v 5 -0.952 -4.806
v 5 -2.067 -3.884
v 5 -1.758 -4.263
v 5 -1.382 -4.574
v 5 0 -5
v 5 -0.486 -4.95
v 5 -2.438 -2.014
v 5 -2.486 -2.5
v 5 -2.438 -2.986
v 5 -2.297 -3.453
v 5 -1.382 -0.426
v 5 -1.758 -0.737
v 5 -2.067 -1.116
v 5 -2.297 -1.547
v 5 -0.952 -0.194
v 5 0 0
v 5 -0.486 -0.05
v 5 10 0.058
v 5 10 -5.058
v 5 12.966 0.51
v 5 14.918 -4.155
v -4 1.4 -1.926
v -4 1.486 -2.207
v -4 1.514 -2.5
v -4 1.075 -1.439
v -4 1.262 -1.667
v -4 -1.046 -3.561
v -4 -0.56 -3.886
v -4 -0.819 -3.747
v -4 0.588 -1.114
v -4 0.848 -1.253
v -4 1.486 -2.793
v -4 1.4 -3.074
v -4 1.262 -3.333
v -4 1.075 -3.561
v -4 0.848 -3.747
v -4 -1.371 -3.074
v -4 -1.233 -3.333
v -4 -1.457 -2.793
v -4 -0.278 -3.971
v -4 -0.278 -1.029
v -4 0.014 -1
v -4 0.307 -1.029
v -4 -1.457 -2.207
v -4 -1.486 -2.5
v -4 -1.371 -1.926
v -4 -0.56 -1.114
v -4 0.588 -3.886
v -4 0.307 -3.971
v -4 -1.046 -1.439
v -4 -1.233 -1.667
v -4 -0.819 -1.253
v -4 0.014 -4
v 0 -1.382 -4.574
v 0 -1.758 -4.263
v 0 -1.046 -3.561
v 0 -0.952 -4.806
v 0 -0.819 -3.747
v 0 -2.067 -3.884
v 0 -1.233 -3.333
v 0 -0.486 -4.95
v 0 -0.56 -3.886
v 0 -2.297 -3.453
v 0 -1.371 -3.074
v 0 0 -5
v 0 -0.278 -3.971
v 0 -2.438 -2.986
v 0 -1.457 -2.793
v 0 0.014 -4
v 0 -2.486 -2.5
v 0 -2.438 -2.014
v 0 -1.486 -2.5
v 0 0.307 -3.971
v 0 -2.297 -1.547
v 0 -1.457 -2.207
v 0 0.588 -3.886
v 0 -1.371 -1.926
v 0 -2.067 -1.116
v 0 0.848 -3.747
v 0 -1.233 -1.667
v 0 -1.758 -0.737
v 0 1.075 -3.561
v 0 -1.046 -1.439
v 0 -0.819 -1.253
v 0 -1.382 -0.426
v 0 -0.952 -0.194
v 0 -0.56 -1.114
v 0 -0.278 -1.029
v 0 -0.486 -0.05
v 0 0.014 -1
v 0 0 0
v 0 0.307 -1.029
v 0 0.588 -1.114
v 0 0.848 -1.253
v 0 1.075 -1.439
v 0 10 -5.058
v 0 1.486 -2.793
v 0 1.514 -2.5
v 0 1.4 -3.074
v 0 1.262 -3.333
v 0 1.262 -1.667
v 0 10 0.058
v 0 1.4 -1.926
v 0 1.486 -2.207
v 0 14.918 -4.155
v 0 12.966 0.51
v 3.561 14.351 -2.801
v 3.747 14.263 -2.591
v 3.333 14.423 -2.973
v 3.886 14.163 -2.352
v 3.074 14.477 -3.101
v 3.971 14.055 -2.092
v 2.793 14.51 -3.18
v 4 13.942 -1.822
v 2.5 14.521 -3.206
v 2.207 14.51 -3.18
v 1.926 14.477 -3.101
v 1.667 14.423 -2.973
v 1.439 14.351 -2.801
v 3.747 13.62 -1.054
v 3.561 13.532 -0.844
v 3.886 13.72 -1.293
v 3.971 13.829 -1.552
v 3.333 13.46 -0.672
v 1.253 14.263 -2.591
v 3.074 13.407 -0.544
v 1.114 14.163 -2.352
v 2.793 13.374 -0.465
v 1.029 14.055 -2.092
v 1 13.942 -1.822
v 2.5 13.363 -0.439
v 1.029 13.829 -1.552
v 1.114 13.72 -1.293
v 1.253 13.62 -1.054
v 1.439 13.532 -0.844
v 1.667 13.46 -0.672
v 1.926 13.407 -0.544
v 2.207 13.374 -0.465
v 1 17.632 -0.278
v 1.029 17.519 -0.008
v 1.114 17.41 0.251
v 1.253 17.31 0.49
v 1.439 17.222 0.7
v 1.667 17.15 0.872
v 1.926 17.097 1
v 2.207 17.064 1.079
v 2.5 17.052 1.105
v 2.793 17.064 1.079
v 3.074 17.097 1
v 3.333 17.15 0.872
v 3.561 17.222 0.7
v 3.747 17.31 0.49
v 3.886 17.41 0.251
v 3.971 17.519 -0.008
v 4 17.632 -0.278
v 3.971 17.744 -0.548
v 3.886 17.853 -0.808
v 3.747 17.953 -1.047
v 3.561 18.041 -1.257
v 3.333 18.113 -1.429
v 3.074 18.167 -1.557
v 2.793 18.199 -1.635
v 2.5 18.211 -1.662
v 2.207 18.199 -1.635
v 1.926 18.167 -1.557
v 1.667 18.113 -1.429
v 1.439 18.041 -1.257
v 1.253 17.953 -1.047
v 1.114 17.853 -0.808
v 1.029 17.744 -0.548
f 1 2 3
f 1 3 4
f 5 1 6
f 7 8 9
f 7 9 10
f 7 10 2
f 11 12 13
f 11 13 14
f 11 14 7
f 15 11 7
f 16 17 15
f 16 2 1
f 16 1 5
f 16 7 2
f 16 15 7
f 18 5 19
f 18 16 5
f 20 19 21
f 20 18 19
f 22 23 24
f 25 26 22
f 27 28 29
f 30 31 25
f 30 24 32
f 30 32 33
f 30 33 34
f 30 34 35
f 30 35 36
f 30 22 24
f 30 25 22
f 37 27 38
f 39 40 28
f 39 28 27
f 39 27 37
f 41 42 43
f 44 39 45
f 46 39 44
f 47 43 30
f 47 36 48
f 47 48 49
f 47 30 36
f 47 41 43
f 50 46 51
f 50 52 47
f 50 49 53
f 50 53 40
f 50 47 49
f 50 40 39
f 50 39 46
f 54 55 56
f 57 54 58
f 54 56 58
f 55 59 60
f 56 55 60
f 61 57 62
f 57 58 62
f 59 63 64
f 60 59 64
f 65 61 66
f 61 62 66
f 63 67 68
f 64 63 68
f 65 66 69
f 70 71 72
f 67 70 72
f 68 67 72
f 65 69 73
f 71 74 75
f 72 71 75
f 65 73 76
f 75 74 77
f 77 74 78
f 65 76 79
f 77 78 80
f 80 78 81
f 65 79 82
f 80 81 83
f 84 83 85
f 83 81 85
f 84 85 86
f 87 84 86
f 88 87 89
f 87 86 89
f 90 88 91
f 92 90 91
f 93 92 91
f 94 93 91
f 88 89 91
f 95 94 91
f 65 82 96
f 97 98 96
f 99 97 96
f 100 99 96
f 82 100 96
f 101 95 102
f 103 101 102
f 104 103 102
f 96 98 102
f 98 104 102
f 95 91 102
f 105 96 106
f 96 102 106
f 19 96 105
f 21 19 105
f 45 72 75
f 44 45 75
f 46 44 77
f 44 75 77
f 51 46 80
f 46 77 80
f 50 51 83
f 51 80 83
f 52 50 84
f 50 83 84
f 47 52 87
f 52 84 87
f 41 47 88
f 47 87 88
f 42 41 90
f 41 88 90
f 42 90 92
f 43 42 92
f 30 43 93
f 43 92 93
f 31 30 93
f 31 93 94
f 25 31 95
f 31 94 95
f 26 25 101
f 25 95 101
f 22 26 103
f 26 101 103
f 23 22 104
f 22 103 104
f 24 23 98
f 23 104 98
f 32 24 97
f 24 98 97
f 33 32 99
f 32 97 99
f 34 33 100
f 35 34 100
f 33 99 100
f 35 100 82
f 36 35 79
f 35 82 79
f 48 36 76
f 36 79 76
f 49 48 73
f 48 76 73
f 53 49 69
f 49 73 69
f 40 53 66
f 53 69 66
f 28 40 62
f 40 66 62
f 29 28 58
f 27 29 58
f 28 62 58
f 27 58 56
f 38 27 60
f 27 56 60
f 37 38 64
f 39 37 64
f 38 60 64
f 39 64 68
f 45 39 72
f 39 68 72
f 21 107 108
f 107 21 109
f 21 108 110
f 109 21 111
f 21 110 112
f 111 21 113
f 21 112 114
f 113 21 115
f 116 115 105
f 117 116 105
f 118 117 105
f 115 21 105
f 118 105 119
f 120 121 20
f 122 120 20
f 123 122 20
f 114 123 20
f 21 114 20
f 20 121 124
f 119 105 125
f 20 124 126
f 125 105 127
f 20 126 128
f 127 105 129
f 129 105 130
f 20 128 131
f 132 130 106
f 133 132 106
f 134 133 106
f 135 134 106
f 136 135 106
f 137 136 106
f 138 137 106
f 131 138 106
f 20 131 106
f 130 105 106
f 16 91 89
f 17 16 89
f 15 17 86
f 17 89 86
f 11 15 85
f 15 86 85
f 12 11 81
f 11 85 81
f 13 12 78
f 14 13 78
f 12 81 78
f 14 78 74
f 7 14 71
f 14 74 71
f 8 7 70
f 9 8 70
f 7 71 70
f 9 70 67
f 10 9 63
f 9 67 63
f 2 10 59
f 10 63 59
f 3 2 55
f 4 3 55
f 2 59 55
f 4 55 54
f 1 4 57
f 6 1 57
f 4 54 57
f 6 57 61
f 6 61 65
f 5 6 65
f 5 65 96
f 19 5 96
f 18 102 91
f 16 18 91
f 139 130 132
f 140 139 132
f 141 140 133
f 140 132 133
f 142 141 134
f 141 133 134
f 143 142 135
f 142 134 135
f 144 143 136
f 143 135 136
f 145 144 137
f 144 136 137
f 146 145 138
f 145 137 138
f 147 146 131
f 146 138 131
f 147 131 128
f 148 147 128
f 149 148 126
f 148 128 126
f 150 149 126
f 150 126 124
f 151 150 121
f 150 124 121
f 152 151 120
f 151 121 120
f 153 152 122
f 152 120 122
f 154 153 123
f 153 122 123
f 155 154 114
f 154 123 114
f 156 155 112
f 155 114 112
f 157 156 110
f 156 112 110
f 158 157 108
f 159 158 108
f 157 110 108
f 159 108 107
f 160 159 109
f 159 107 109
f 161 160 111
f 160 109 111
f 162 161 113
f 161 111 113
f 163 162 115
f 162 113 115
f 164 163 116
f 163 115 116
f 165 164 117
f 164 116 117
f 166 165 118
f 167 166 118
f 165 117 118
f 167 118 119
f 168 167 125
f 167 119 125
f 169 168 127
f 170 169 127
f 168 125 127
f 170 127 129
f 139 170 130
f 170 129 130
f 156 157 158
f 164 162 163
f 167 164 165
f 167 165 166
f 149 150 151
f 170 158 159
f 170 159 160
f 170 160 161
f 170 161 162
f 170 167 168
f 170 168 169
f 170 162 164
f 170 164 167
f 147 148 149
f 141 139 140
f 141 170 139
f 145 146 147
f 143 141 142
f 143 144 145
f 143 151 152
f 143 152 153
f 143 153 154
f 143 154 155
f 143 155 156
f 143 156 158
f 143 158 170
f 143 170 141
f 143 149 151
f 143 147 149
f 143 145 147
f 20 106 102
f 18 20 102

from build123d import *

# Parameters (mm, degrees)
F1_DEPTH = 5
F2_R     = 1.5
F3_DEPTH = 4
F4_R     = 1.5
F5_DEPTH = 4


with BuildPart() as f1:
    # F0 (on Right) → F1 (new body)
    with BuildSketch(Plane.YZ):
        Polygon((9.999834287, 0.0575693728), (0, 0), (0, -5), (9.999834287, -5.0575693728), (14.9176799717, -4.1549100676), (12.9655016395, 0.510136665), align=None)
        with BuildLine():
            Line((0, -5), (0, 0))
            ThreePointArc((0, 0), (-2.4856488472, -2.5), (0, -5))
        make_face()
    extrude(amount=F1_DEPTH)

    # F2 (on face) → F3 (join)
    with BuildSketch(Plane(origin=(0, 0, 0), x_dir=(0, -1, 0), z_dir=(-1, 0, 0))):
        with Locations((-0.0143925817, -2.5)):
            Circle(F2_R)
    extrude(amount=F3_DEPTH)

    # F4 (on face) → F5 (join)
    with BuildSketch(Plane(origin=(0, 11.2150399751, 4.6931487054), x_dir=(-1, 0, 0), z_dir=(0, 0.9224854916, 0.3860317574))):
        with Locations((-2.5, -7.0630220916)):
            Circle(F4_R)
    extrude(amount=F5_DEPTH)


solid = f1.part
